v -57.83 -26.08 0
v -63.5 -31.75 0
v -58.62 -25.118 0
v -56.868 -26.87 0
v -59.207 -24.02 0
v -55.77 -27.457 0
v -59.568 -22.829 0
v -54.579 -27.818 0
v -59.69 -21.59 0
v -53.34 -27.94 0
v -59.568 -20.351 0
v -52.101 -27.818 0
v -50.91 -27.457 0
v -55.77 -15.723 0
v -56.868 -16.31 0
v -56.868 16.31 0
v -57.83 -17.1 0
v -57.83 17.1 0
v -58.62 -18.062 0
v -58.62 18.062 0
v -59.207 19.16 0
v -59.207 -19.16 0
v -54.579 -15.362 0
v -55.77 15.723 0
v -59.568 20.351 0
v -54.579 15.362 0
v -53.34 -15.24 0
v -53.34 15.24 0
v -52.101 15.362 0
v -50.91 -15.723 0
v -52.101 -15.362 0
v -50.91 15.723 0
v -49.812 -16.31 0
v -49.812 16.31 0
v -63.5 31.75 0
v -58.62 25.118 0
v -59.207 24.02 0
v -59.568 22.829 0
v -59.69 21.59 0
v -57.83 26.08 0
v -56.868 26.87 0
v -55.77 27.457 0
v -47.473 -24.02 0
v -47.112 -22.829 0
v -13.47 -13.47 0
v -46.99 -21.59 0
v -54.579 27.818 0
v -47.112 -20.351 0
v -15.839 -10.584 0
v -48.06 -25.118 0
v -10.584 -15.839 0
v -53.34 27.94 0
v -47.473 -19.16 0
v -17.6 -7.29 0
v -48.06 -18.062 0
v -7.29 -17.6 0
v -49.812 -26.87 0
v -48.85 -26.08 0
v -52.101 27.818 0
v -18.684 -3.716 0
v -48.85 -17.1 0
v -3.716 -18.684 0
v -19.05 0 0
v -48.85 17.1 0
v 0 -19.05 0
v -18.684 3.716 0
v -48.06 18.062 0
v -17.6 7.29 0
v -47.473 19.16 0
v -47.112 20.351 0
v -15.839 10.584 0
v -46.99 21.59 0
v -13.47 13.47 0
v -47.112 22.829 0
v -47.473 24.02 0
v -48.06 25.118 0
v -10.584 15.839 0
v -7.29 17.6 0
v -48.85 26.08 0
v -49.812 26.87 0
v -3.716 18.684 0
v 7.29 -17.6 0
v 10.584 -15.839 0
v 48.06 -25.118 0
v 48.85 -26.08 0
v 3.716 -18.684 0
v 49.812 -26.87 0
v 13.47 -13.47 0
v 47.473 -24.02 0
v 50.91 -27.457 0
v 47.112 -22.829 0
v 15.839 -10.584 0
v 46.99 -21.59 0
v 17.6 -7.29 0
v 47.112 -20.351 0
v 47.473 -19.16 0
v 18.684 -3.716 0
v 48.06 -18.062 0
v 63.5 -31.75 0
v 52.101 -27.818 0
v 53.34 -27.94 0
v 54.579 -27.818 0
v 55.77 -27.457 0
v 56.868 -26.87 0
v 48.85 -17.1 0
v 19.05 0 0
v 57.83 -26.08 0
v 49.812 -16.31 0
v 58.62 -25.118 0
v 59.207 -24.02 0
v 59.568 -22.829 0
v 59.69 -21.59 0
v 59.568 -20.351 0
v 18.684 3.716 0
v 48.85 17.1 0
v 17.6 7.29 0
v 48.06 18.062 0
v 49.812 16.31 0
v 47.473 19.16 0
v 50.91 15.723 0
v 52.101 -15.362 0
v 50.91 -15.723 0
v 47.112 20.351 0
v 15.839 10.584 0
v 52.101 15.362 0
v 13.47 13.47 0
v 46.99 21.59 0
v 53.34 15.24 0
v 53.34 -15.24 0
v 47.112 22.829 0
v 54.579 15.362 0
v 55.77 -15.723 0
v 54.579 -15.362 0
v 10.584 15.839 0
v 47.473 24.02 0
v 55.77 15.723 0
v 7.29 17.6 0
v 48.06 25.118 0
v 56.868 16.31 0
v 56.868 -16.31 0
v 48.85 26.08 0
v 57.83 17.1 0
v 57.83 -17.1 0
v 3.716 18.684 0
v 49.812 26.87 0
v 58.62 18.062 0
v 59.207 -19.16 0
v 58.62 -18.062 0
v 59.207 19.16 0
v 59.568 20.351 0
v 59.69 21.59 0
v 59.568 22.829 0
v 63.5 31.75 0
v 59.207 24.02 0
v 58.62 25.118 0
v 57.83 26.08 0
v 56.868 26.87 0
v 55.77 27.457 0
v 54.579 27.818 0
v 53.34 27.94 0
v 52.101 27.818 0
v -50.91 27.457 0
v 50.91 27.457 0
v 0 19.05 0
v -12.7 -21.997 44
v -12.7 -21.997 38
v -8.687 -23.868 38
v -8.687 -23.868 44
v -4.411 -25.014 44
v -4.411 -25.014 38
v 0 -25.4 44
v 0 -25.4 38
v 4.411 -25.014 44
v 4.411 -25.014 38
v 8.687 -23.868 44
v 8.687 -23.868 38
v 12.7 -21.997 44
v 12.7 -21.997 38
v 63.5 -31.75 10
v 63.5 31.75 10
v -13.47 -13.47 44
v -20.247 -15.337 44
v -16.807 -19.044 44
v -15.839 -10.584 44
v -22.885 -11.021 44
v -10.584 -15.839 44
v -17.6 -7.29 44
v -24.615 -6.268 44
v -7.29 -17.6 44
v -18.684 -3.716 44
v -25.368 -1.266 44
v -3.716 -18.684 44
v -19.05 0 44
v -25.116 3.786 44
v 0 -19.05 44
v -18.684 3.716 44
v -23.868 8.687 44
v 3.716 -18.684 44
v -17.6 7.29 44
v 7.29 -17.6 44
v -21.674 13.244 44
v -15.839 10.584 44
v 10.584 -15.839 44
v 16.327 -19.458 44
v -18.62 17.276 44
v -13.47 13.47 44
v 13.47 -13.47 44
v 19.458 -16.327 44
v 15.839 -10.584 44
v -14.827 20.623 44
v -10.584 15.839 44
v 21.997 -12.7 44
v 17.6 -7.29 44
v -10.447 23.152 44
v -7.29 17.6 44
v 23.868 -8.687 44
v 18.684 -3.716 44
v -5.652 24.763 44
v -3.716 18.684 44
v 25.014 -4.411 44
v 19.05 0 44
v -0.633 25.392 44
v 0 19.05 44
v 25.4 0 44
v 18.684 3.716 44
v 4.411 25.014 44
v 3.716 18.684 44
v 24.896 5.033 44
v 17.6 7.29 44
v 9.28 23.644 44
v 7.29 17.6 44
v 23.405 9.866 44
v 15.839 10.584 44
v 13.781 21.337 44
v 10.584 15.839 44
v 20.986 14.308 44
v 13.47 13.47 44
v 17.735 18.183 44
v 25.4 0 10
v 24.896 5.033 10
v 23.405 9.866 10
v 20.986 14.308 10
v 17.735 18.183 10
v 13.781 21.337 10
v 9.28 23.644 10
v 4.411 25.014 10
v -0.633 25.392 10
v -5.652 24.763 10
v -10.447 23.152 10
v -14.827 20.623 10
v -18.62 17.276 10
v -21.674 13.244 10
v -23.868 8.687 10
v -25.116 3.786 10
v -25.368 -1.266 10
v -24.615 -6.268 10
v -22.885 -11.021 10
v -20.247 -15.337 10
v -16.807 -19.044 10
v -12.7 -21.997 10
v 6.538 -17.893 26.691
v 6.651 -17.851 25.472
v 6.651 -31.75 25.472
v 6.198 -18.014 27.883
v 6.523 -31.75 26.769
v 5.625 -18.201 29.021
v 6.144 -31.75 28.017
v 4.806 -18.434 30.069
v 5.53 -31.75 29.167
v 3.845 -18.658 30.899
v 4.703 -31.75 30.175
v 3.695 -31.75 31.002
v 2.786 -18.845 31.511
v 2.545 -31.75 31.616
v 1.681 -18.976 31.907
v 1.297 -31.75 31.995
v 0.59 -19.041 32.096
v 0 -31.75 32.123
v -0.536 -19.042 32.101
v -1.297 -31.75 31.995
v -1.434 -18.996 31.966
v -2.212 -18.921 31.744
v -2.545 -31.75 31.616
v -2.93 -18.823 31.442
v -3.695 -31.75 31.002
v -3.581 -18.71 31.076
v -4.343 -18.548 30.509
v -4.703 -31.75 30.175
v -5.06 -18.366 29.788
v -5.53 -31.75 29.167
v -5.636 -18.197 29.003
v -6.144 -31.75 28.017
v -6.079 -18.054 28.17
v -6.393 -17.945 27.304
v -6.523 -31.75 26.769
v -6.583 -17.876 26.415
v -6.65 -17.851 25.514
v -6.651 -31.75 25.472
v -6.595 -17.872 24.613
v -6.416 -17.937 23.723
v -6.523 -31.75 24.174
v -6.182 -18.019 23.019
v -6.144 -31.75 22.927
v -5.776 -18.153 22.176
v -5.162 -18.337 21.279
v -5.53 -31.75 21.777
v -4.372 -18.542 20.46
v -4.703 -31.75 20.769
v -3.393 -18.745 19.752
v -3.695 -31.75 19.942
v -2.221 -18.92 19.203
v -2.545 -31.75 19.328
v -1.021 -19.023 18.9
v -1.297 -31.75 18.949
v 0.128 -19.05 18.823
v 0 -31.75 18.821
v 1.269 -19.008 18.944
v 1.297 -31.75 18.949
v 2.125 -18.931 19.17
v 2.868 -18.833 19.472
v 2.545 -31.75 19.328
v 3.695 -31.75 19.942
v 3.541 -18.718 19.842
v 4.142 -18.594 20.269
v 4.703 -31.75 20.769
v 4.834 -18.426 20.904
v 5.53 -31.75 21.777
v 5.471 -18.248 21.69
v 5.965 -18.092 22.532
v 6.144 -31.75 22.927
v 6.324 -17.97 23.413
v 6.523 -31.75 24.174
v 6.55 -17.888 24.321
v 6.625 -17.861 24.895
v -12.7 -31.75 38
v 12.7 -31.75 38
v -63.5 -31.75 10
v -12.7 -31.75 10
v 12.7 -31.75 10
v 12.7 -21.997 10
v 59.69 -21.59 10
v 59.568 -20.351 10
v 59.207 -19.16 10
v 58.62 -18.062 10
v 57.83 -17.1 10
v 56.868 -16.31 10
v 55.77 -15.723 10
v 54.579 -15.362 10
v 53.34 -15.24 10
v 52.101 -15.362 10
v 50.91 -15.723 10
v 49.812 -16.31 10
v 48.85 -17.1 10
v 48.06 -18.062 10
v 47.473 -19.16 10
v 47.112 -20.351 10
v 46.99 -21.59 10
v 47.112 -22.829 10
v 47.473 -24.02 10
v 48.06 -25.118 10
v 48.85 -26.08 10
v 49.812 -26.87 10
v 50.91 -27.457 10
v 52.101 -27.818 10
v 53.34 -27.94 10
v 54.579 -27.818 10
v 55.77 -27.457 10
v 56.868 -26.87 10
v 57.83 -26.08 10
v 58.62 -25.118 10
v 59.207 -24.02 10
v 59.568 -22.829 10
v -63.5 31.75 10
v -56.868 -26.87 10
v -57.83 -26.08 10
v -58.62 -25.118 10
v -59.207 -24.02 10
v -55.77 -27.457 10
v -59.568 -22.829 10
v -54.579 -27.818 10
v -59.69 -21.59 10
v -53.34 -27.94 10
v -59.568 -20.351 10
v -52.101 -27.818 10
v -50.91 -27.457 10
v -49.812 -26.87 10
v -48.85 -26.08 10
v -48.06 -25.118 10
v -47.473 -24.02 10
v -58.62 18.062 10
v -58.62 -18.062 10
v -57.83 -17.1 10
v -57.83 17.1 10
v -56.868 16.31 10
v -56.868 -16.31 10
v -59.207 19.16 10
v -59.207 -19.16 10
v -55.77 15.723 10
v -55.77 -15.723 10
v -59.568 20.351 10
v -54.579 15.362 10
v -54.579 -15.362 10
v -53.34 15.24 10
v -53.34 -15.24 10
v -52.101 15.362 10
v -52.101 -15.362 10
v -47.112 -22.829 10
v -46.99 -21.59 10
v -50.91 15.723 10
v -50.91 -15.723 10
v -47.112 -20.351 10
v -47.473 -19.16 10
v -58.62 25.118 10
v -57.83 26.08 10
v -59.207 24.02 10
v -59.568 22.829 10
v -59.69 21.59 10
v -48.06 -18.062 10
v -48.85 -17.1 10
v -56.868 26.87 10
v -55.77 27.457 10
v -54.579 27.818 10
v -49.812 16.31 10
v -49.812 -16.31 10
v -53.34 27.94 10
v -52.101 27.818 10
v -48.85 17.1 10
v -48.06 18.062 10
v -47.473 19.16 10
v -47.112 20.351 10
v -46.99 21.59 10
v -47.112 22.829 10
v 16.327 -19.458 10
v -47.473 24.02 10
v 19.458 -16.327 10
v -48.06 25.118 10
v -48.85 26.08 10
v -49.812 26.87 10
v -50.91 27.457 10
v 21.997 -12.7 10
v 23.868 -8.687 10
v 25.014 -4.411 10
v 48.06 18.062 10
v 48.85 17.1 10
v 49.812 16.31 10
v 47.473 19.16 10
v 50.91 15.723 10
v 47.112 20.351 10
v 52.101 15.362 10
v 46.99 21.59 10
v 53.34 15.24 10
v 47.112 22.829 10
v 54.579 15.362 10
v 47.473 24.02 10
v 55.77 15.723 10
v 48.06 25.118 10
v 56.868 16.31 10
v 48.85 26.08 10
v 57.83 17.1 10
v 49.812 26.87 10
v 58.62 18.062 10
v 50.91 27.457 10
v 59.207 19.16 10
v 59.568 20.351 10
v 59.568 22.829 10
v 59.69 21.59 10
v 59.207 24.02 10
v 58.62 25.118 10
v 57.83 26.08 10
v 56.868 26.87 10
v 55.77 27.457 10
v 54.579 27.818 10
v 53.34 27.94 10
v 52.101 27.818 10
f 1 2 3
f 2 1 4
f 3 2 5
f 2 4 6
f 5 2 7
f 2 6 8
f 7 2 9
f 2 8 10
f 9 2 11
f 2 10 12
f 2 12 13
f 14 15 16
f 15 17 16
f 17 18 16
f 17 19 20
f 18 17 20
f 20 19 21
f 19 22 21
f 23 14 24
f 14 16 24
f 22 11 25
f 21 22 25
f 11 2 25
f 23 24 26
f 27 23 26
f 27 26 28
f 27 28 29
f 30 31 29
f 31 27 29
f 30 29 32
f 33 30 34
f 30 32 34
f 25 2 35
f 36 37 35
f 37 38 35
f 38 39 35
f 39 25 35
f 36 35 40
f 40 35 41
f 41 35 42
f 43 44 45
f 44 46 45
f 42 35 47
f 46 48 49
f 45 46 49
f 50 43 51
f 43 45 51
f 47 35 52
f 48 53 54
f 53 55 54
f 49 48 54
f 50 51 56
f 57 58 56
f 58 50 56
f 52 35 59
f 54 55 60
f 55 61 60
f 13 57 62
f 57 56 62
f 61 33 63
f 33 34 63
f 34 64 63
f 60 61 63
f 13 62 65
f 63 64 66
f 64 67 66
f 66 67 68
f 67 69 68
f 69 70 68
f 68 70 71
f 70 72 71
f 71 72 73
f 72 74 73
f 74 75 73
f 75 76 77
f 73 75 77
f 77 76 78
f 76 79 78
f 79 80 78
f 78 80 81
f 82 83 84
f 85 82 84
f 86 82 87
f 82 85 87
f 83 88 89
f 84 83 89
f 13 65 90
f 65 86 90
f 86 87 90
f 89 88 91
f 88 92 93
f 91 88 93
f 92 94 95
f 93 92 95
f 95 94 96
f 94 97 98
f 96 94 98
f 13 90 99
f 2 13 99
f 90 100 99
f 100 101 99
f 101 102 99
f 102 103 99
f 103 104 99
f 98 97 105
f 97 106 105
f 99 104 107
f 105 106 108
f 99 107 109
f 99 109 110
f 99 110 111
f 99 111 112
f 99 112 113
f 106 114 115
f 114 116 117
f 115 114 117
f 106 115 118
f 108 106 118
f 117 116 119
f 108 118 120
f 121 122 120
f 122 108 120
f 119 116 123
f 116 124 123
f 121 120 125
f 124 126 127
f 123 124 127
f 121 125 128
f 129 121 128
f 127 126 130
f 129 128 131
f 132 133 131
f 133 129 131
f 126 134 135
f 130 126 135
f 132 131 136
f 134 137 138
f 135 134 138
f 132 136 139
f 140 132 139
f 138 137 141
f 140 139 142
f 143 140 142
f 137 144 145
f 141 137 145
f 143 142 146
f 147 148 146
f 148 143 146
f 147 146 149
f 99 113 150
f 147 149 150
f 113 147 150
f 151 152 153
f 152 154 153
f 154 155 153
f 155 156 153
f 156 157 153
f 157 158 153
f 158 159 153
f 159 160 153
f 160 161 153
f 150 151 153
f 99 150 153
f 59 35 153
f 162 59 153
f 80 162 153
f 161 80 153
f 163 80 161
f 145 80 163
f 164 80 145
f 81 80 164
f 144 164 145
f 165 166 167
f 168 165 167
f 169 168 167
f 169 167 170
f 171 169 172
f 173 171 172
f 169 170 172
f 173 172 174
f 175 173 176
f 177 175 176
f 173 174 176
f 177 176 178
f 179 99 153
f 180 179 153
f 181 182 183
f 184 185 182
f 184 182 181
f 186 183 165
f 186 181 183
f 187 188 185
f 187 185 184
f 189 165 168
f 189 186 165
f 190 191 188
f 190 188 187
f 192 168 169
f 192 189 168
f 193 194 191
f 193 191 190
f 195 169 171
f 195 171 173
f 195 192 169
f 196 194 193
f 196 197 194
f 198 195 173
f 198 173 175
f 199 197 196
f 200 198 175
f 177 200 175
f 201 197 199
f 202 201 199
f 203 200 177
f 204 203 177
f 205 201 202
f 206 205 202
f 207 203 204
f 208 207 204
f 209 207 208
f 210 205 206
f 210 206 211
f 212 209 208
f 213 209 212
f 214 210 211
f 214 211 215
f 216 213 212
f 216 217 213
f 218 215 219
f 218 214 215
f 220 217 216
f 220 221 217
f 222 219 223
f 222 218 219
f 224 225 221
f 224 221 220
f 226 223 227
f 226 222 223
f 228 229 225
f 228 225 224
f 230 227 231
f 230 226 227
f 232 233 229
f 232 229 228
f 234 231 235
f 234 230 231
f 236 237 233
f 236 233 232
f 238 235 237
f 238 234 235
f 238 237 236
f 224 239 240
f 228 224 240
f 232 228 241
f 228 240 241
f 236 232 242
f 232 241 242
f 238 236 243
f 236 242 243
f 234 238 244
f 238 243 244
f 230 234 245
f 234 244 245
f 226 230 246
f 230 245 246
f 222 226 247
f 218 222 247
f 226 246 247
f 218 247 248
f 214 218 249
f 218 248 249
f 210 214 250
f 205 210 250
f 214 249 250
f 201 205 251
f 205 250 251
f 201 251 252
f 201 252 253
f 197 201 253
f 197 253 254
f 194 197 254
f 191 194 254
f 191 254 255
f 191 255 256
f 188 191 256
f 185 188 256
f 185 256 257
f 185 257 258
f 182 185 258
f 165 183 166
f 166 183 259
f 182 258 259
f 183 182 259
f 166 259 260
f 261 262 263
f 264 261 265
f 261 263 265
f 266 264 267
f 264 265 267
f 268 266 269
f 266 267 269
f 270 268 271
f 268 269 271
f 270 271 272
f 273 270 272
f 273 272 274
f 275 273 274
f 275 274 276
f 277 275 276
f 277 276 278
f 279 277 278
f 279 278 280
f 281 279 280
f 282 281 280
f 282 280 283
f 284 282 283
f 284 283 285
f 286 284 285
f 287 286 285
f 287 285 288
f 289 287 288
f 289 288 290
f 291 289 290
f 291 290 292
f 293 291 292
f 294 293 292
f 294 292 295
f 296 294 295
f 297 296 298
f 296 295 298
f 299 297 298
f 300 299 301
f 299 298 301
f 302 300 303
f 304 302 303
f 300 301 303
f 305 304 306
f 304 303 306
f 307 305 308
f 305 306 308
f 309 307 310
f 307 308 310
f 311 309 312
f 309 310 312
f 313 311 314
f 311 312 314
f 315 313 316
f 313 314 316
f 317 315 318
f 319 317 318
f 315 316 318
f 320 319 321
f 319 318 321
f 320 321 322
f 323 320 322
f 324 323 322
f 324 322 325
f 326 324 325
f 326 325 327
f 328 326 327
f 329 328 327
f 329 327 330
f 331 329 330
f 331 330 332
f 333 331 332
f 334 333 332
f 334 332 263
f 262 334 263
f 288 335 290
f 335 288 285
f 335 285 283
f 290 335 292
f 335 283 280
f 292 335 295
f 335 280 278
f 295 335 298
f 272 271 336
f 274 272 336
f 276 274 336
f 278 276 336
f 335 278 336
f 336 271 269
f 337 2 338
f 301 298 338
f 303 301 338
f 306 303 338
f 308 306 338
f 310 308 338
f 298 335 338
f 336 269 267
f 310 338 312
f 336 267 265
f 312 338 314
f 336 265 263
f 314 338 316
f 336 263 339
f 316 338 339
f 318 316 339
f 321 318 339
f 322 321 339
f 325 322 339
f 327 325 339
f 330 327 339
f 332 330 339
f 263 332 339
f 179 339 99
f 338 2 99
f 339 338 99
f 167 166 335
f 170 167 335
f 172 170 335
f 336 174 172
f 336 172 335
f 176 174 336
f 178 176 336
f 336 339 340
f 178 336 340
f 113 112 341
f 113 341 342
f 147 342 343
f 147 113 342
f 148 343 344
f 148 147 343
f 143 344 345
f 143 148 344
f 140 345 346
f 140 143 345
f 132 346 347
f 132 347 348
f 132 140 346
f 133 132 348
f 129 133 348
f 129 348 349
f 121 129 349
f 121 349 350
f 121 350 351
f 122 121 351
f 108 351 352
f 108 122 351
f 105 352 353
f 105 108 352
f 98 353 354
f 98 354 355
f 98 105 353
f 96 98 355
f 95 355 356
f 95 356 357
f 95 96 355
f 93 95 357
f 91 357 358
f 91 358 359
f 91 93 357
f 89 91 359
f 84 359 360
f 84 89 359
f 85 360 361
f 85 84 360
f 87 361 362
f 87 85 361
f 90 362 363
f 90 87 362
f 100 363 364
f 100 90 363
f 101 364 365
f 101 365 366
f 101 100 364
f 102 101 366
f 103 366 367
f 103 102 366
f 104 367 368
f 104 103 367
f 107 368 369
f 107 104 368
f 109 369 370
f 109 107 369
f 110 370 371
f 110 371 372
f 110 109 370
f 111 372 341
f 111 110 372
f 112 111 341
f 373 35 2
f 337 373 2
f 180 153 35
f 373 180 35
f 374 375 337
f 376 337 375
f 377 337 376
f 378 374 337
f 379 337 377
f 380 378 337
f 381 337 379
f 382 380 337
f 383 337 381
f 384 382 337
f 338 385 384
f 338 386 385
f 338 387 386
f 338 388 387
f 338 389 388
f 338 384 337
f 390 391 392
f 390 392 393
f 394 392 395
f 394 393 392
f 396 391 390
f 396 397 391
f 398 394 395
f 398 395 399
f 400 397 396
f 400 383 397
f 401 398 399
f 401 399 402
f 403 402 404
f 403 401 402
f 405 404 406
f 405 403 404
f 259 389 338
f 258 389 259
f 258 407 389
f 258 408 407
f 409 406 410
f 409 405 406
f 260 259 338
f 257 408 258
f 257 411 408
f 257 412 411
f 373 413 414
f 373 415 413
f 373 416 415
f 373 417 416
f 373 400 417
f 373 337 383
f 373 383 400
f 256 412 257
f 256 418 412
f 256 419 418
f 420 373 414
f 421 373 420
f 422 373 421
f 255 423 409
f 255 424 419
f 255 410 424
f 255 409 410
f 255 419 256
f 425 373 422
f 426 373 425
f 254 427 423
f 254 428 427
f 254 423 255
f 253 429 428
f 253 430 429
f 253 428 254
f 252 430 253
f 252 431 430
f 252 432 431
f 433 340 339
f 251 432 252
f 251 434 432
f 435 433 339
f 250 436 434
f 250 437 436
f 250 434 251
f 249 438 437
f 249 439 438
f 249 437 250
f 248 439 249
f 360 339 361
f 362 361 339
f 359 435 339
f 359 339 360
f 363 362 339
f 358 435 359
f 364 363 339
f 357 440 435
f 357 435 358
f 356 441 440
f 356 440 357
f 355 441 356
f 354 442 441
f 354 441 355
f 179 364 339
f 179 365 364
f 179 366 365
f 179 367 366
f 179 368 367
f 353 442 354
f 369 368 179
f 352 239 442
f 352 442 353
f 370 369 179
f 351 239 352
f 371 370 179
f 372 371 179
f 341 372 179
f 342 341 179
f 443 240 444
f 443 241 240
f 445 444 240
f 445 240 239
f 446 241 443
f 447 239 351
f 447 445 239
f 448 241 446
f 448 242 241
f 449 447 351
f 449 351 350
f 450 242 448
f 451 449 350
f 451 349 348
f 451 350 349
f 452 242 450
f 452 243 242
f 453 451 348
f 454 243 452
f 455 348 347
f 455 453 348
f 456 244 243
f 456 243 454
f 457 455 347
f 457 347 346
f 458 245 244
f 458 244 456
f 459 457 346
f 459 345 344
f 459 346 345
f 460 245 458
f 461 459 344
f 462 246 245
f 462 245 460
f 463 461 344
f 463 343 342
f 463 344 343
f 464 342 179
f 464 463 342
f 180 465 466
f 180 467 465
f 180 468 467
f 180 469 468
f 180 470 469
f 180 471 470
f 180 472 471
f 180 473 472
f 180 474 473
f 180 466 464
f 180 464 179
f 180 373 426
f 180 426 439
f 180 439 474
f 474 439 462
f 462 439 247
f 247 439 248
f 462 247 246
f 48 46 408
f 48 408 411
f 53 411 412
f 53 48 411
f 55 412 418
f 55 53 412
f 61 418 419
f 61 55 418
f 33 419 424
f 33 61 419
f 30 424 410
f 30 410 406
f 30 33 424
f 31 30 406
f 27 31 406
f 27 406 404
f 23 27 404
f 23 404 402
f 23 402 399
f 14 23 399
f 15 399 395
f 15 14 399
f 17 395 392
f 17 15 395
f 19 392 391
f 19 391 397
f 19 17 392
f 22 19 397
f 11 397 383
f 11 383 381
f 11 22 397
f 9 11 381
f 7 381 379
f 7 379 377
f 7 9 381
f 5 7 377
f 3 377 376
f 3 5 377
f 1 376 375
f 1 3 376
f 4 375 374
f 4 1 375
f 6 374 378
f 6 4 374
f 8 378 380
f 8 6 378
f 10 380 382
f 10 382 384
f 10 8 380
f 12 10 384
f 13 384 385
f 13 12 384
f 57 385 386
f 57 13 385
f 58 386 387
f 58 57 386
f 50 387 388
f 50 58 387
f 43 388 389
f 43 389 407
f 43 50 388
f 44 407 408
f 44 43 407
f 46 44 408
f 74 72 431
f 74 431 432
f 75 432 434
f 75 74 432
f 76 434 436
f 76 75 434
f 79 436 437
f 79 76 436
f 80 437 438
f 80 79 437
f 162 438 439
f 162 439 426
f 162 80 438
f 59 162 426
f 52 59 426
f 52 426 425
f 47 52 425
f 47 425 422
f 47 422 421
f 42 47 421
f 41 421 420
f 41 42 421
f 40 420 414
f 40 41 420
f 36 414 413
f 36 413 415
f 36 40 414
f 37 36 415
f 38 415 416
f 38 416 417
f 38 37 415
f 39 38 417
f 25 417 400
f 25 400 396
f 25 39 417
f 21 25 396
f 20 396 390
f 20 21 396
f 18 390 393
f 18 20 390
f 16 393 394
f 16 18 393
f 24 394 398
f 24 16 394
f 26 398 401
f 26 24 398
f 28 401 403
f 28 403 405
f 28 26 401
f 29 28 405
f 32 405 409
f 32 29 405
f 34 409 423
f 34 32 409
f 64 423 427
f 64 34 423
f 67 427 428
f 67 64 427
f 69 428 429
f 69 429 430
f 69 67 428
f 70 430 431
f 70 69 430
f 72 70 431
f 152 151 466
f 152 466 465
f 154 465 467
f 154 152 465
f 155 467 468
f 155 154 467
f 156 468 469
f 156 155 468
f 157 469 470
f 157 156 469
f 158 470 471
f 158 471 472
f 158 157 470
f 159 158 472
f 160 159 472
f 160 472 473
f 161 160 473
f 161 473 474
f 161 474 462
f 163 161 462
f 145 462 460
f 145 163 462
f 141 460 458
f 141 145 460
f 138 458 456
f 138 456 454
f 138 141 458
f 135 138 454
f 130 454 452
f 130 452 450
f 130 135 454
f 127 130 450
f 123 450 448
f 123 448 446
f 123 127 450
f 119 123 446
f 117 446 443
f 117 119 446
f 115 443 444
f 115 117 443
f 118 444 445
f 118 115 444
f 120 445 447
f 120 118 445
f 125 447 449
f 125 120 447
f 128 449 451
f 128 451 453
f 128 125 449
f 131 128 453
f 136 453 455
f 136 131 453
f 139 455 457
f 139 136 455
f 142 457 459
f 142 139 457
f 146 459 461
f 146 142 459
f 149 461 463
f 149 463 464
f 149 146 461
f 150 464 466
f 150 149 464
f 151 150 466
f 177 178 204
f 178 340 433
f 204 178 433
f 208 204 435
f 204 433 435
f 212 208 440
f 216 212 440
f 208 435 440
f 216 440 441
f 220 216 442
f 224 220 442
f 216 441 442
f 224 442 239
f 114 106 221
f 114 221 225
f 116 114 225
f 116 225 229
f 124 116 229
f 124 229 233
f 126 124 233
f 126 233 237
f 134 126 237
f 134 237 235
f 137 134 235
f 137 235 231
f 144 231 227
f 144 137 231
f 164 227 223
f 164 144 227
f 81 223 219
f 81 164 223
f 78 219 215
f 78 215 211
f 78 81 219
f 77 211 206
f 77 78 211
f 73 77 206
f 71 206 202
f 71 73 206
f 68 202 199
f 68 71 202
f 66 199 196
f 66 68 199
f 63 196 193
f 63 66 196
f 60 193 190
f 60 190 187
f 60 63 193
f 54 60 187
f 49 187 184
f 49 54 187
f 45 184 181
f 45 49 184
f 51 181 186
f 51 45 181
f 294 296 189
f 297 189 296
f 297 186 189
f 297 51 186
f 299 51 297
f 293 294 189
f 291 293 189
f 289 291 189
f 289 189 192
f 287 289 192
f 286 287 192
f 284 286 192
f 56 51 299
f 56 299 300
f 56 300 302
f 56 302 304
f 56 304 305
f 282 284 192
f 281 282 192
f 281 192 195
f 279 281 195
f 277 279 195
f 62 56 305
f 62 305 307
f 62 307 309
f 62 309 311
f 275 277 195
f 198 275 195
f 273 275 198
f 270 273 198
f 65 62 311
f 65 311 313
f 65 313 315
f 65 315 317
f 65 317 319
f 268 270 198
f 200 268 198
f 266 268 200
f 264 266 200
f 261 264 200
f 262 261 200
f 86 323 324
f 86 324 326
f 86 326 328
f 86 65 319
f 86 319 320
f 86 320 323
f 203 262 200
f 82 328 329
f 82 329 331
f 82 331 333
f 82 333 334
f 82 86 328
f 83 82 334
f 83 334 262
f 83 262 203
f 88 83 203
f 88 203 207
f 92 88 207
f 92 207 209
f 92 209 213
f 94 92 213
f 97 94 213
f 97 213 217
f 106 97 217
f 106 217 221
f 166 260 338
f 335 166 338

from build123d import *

# Parameters (mm, degrees)
F0_R     = 6.35
F1_DEPTH = 10
F0_R_2   = 19.05
F2_DEPTH = 44
F3_DEPTH = 38
F4_R     = 6.6505969319
F5_DEPTH = 14.8986119061


with BuildPart() as f1:
    # F0 (on Top) → F1 (new body)
    with BuildSketch(Plane.XY):
        with BuildLine():
            Line((63.5, 31.75), (-63.5, 31.75))
            Line((-63.5, 31.75), (-63.5, -31.75))
            Line((-63.5, -31.75), (-12.7, -31.75))
            Line((-12.7, -31.75), (-12.7, -21.9970452561))
            ThreePointArc((-12.7, -21.9970452561), (-12.7, 21.9970452561), (25.4, 0))
            ThreePointArc((25.4, 0), (21.9970452561, -12.7), (12.7, -21.9970452561))
            Line((12.7, -21.9970452561), (12.7, -31.75))
            Line((12.7, -31.75), (63.5, -31.75))
            Line((63.5, -31.75), (63.5, 31.75))
        make_face()
        with Locations((-53.34, -21.59)):
            Circle(F0_R, mode=Mode.SUBTRACT)
        with Locations((53.34, -21.59)):
            Circle(F0_R, mode=Mode.SUBTRACT)
        with Locations((-53.34, 21.59)):
            Circle(F0_R, mode=Mode.SUBTRACT)
        with Locations((53.34, 21.59)):
            Circle(F0_R, mode=Mode.SUBTRACT)
    extrude(amount=F1_DEPTH)

    # F0 (on Top) → F2 (join)
    with BuildSketch(Plane.XY):
        with BuildLine():
            ThreePointArc((25.4, 0), (-12.7, 21.9970452561), (-12.7, -21.9970452561))
            ThreePointArc((-12.7, -21.9970452561), (0, -25.4), (12.7, -21.9970452561))
            ThreePointArc((12.7, -21.9970452561), (21.9970452561, -12.7), (25.4, 0))
        make_face()
        Circle(F0_R_2, mode=Mode.SUBTRACT)
    extrude(amount=F2_DEPTH)

    # F0 (on Top) → F3 (join)
    with BuildSketch(Plane.XY):
        with BuildLine():
            Line((-12.7, -21.9970452561), (-12.7, -31.75))
            Line((-12.7, -31.75), (12.7, -31.75))
            Line((12.7, -31.75), (12.7, -21.9970452561))
            ThreePointArc((12.7, -21.9970452561), (0, -25.4), (-12.7, -21.9970452561))
        make_face()
    extrude(amount=F3_DEPTH)

    # F4 (on face) → F5 (cut, up to face)
    with BuildSketch(Plane.XZ.offset(31.75)):
        with Locations((0, 25.4719480872)):
            Circle(F4_R)
    extrude(amount=-F5_DEPTH, mode=Mode.SUBTRACT)


solid = f1.part
